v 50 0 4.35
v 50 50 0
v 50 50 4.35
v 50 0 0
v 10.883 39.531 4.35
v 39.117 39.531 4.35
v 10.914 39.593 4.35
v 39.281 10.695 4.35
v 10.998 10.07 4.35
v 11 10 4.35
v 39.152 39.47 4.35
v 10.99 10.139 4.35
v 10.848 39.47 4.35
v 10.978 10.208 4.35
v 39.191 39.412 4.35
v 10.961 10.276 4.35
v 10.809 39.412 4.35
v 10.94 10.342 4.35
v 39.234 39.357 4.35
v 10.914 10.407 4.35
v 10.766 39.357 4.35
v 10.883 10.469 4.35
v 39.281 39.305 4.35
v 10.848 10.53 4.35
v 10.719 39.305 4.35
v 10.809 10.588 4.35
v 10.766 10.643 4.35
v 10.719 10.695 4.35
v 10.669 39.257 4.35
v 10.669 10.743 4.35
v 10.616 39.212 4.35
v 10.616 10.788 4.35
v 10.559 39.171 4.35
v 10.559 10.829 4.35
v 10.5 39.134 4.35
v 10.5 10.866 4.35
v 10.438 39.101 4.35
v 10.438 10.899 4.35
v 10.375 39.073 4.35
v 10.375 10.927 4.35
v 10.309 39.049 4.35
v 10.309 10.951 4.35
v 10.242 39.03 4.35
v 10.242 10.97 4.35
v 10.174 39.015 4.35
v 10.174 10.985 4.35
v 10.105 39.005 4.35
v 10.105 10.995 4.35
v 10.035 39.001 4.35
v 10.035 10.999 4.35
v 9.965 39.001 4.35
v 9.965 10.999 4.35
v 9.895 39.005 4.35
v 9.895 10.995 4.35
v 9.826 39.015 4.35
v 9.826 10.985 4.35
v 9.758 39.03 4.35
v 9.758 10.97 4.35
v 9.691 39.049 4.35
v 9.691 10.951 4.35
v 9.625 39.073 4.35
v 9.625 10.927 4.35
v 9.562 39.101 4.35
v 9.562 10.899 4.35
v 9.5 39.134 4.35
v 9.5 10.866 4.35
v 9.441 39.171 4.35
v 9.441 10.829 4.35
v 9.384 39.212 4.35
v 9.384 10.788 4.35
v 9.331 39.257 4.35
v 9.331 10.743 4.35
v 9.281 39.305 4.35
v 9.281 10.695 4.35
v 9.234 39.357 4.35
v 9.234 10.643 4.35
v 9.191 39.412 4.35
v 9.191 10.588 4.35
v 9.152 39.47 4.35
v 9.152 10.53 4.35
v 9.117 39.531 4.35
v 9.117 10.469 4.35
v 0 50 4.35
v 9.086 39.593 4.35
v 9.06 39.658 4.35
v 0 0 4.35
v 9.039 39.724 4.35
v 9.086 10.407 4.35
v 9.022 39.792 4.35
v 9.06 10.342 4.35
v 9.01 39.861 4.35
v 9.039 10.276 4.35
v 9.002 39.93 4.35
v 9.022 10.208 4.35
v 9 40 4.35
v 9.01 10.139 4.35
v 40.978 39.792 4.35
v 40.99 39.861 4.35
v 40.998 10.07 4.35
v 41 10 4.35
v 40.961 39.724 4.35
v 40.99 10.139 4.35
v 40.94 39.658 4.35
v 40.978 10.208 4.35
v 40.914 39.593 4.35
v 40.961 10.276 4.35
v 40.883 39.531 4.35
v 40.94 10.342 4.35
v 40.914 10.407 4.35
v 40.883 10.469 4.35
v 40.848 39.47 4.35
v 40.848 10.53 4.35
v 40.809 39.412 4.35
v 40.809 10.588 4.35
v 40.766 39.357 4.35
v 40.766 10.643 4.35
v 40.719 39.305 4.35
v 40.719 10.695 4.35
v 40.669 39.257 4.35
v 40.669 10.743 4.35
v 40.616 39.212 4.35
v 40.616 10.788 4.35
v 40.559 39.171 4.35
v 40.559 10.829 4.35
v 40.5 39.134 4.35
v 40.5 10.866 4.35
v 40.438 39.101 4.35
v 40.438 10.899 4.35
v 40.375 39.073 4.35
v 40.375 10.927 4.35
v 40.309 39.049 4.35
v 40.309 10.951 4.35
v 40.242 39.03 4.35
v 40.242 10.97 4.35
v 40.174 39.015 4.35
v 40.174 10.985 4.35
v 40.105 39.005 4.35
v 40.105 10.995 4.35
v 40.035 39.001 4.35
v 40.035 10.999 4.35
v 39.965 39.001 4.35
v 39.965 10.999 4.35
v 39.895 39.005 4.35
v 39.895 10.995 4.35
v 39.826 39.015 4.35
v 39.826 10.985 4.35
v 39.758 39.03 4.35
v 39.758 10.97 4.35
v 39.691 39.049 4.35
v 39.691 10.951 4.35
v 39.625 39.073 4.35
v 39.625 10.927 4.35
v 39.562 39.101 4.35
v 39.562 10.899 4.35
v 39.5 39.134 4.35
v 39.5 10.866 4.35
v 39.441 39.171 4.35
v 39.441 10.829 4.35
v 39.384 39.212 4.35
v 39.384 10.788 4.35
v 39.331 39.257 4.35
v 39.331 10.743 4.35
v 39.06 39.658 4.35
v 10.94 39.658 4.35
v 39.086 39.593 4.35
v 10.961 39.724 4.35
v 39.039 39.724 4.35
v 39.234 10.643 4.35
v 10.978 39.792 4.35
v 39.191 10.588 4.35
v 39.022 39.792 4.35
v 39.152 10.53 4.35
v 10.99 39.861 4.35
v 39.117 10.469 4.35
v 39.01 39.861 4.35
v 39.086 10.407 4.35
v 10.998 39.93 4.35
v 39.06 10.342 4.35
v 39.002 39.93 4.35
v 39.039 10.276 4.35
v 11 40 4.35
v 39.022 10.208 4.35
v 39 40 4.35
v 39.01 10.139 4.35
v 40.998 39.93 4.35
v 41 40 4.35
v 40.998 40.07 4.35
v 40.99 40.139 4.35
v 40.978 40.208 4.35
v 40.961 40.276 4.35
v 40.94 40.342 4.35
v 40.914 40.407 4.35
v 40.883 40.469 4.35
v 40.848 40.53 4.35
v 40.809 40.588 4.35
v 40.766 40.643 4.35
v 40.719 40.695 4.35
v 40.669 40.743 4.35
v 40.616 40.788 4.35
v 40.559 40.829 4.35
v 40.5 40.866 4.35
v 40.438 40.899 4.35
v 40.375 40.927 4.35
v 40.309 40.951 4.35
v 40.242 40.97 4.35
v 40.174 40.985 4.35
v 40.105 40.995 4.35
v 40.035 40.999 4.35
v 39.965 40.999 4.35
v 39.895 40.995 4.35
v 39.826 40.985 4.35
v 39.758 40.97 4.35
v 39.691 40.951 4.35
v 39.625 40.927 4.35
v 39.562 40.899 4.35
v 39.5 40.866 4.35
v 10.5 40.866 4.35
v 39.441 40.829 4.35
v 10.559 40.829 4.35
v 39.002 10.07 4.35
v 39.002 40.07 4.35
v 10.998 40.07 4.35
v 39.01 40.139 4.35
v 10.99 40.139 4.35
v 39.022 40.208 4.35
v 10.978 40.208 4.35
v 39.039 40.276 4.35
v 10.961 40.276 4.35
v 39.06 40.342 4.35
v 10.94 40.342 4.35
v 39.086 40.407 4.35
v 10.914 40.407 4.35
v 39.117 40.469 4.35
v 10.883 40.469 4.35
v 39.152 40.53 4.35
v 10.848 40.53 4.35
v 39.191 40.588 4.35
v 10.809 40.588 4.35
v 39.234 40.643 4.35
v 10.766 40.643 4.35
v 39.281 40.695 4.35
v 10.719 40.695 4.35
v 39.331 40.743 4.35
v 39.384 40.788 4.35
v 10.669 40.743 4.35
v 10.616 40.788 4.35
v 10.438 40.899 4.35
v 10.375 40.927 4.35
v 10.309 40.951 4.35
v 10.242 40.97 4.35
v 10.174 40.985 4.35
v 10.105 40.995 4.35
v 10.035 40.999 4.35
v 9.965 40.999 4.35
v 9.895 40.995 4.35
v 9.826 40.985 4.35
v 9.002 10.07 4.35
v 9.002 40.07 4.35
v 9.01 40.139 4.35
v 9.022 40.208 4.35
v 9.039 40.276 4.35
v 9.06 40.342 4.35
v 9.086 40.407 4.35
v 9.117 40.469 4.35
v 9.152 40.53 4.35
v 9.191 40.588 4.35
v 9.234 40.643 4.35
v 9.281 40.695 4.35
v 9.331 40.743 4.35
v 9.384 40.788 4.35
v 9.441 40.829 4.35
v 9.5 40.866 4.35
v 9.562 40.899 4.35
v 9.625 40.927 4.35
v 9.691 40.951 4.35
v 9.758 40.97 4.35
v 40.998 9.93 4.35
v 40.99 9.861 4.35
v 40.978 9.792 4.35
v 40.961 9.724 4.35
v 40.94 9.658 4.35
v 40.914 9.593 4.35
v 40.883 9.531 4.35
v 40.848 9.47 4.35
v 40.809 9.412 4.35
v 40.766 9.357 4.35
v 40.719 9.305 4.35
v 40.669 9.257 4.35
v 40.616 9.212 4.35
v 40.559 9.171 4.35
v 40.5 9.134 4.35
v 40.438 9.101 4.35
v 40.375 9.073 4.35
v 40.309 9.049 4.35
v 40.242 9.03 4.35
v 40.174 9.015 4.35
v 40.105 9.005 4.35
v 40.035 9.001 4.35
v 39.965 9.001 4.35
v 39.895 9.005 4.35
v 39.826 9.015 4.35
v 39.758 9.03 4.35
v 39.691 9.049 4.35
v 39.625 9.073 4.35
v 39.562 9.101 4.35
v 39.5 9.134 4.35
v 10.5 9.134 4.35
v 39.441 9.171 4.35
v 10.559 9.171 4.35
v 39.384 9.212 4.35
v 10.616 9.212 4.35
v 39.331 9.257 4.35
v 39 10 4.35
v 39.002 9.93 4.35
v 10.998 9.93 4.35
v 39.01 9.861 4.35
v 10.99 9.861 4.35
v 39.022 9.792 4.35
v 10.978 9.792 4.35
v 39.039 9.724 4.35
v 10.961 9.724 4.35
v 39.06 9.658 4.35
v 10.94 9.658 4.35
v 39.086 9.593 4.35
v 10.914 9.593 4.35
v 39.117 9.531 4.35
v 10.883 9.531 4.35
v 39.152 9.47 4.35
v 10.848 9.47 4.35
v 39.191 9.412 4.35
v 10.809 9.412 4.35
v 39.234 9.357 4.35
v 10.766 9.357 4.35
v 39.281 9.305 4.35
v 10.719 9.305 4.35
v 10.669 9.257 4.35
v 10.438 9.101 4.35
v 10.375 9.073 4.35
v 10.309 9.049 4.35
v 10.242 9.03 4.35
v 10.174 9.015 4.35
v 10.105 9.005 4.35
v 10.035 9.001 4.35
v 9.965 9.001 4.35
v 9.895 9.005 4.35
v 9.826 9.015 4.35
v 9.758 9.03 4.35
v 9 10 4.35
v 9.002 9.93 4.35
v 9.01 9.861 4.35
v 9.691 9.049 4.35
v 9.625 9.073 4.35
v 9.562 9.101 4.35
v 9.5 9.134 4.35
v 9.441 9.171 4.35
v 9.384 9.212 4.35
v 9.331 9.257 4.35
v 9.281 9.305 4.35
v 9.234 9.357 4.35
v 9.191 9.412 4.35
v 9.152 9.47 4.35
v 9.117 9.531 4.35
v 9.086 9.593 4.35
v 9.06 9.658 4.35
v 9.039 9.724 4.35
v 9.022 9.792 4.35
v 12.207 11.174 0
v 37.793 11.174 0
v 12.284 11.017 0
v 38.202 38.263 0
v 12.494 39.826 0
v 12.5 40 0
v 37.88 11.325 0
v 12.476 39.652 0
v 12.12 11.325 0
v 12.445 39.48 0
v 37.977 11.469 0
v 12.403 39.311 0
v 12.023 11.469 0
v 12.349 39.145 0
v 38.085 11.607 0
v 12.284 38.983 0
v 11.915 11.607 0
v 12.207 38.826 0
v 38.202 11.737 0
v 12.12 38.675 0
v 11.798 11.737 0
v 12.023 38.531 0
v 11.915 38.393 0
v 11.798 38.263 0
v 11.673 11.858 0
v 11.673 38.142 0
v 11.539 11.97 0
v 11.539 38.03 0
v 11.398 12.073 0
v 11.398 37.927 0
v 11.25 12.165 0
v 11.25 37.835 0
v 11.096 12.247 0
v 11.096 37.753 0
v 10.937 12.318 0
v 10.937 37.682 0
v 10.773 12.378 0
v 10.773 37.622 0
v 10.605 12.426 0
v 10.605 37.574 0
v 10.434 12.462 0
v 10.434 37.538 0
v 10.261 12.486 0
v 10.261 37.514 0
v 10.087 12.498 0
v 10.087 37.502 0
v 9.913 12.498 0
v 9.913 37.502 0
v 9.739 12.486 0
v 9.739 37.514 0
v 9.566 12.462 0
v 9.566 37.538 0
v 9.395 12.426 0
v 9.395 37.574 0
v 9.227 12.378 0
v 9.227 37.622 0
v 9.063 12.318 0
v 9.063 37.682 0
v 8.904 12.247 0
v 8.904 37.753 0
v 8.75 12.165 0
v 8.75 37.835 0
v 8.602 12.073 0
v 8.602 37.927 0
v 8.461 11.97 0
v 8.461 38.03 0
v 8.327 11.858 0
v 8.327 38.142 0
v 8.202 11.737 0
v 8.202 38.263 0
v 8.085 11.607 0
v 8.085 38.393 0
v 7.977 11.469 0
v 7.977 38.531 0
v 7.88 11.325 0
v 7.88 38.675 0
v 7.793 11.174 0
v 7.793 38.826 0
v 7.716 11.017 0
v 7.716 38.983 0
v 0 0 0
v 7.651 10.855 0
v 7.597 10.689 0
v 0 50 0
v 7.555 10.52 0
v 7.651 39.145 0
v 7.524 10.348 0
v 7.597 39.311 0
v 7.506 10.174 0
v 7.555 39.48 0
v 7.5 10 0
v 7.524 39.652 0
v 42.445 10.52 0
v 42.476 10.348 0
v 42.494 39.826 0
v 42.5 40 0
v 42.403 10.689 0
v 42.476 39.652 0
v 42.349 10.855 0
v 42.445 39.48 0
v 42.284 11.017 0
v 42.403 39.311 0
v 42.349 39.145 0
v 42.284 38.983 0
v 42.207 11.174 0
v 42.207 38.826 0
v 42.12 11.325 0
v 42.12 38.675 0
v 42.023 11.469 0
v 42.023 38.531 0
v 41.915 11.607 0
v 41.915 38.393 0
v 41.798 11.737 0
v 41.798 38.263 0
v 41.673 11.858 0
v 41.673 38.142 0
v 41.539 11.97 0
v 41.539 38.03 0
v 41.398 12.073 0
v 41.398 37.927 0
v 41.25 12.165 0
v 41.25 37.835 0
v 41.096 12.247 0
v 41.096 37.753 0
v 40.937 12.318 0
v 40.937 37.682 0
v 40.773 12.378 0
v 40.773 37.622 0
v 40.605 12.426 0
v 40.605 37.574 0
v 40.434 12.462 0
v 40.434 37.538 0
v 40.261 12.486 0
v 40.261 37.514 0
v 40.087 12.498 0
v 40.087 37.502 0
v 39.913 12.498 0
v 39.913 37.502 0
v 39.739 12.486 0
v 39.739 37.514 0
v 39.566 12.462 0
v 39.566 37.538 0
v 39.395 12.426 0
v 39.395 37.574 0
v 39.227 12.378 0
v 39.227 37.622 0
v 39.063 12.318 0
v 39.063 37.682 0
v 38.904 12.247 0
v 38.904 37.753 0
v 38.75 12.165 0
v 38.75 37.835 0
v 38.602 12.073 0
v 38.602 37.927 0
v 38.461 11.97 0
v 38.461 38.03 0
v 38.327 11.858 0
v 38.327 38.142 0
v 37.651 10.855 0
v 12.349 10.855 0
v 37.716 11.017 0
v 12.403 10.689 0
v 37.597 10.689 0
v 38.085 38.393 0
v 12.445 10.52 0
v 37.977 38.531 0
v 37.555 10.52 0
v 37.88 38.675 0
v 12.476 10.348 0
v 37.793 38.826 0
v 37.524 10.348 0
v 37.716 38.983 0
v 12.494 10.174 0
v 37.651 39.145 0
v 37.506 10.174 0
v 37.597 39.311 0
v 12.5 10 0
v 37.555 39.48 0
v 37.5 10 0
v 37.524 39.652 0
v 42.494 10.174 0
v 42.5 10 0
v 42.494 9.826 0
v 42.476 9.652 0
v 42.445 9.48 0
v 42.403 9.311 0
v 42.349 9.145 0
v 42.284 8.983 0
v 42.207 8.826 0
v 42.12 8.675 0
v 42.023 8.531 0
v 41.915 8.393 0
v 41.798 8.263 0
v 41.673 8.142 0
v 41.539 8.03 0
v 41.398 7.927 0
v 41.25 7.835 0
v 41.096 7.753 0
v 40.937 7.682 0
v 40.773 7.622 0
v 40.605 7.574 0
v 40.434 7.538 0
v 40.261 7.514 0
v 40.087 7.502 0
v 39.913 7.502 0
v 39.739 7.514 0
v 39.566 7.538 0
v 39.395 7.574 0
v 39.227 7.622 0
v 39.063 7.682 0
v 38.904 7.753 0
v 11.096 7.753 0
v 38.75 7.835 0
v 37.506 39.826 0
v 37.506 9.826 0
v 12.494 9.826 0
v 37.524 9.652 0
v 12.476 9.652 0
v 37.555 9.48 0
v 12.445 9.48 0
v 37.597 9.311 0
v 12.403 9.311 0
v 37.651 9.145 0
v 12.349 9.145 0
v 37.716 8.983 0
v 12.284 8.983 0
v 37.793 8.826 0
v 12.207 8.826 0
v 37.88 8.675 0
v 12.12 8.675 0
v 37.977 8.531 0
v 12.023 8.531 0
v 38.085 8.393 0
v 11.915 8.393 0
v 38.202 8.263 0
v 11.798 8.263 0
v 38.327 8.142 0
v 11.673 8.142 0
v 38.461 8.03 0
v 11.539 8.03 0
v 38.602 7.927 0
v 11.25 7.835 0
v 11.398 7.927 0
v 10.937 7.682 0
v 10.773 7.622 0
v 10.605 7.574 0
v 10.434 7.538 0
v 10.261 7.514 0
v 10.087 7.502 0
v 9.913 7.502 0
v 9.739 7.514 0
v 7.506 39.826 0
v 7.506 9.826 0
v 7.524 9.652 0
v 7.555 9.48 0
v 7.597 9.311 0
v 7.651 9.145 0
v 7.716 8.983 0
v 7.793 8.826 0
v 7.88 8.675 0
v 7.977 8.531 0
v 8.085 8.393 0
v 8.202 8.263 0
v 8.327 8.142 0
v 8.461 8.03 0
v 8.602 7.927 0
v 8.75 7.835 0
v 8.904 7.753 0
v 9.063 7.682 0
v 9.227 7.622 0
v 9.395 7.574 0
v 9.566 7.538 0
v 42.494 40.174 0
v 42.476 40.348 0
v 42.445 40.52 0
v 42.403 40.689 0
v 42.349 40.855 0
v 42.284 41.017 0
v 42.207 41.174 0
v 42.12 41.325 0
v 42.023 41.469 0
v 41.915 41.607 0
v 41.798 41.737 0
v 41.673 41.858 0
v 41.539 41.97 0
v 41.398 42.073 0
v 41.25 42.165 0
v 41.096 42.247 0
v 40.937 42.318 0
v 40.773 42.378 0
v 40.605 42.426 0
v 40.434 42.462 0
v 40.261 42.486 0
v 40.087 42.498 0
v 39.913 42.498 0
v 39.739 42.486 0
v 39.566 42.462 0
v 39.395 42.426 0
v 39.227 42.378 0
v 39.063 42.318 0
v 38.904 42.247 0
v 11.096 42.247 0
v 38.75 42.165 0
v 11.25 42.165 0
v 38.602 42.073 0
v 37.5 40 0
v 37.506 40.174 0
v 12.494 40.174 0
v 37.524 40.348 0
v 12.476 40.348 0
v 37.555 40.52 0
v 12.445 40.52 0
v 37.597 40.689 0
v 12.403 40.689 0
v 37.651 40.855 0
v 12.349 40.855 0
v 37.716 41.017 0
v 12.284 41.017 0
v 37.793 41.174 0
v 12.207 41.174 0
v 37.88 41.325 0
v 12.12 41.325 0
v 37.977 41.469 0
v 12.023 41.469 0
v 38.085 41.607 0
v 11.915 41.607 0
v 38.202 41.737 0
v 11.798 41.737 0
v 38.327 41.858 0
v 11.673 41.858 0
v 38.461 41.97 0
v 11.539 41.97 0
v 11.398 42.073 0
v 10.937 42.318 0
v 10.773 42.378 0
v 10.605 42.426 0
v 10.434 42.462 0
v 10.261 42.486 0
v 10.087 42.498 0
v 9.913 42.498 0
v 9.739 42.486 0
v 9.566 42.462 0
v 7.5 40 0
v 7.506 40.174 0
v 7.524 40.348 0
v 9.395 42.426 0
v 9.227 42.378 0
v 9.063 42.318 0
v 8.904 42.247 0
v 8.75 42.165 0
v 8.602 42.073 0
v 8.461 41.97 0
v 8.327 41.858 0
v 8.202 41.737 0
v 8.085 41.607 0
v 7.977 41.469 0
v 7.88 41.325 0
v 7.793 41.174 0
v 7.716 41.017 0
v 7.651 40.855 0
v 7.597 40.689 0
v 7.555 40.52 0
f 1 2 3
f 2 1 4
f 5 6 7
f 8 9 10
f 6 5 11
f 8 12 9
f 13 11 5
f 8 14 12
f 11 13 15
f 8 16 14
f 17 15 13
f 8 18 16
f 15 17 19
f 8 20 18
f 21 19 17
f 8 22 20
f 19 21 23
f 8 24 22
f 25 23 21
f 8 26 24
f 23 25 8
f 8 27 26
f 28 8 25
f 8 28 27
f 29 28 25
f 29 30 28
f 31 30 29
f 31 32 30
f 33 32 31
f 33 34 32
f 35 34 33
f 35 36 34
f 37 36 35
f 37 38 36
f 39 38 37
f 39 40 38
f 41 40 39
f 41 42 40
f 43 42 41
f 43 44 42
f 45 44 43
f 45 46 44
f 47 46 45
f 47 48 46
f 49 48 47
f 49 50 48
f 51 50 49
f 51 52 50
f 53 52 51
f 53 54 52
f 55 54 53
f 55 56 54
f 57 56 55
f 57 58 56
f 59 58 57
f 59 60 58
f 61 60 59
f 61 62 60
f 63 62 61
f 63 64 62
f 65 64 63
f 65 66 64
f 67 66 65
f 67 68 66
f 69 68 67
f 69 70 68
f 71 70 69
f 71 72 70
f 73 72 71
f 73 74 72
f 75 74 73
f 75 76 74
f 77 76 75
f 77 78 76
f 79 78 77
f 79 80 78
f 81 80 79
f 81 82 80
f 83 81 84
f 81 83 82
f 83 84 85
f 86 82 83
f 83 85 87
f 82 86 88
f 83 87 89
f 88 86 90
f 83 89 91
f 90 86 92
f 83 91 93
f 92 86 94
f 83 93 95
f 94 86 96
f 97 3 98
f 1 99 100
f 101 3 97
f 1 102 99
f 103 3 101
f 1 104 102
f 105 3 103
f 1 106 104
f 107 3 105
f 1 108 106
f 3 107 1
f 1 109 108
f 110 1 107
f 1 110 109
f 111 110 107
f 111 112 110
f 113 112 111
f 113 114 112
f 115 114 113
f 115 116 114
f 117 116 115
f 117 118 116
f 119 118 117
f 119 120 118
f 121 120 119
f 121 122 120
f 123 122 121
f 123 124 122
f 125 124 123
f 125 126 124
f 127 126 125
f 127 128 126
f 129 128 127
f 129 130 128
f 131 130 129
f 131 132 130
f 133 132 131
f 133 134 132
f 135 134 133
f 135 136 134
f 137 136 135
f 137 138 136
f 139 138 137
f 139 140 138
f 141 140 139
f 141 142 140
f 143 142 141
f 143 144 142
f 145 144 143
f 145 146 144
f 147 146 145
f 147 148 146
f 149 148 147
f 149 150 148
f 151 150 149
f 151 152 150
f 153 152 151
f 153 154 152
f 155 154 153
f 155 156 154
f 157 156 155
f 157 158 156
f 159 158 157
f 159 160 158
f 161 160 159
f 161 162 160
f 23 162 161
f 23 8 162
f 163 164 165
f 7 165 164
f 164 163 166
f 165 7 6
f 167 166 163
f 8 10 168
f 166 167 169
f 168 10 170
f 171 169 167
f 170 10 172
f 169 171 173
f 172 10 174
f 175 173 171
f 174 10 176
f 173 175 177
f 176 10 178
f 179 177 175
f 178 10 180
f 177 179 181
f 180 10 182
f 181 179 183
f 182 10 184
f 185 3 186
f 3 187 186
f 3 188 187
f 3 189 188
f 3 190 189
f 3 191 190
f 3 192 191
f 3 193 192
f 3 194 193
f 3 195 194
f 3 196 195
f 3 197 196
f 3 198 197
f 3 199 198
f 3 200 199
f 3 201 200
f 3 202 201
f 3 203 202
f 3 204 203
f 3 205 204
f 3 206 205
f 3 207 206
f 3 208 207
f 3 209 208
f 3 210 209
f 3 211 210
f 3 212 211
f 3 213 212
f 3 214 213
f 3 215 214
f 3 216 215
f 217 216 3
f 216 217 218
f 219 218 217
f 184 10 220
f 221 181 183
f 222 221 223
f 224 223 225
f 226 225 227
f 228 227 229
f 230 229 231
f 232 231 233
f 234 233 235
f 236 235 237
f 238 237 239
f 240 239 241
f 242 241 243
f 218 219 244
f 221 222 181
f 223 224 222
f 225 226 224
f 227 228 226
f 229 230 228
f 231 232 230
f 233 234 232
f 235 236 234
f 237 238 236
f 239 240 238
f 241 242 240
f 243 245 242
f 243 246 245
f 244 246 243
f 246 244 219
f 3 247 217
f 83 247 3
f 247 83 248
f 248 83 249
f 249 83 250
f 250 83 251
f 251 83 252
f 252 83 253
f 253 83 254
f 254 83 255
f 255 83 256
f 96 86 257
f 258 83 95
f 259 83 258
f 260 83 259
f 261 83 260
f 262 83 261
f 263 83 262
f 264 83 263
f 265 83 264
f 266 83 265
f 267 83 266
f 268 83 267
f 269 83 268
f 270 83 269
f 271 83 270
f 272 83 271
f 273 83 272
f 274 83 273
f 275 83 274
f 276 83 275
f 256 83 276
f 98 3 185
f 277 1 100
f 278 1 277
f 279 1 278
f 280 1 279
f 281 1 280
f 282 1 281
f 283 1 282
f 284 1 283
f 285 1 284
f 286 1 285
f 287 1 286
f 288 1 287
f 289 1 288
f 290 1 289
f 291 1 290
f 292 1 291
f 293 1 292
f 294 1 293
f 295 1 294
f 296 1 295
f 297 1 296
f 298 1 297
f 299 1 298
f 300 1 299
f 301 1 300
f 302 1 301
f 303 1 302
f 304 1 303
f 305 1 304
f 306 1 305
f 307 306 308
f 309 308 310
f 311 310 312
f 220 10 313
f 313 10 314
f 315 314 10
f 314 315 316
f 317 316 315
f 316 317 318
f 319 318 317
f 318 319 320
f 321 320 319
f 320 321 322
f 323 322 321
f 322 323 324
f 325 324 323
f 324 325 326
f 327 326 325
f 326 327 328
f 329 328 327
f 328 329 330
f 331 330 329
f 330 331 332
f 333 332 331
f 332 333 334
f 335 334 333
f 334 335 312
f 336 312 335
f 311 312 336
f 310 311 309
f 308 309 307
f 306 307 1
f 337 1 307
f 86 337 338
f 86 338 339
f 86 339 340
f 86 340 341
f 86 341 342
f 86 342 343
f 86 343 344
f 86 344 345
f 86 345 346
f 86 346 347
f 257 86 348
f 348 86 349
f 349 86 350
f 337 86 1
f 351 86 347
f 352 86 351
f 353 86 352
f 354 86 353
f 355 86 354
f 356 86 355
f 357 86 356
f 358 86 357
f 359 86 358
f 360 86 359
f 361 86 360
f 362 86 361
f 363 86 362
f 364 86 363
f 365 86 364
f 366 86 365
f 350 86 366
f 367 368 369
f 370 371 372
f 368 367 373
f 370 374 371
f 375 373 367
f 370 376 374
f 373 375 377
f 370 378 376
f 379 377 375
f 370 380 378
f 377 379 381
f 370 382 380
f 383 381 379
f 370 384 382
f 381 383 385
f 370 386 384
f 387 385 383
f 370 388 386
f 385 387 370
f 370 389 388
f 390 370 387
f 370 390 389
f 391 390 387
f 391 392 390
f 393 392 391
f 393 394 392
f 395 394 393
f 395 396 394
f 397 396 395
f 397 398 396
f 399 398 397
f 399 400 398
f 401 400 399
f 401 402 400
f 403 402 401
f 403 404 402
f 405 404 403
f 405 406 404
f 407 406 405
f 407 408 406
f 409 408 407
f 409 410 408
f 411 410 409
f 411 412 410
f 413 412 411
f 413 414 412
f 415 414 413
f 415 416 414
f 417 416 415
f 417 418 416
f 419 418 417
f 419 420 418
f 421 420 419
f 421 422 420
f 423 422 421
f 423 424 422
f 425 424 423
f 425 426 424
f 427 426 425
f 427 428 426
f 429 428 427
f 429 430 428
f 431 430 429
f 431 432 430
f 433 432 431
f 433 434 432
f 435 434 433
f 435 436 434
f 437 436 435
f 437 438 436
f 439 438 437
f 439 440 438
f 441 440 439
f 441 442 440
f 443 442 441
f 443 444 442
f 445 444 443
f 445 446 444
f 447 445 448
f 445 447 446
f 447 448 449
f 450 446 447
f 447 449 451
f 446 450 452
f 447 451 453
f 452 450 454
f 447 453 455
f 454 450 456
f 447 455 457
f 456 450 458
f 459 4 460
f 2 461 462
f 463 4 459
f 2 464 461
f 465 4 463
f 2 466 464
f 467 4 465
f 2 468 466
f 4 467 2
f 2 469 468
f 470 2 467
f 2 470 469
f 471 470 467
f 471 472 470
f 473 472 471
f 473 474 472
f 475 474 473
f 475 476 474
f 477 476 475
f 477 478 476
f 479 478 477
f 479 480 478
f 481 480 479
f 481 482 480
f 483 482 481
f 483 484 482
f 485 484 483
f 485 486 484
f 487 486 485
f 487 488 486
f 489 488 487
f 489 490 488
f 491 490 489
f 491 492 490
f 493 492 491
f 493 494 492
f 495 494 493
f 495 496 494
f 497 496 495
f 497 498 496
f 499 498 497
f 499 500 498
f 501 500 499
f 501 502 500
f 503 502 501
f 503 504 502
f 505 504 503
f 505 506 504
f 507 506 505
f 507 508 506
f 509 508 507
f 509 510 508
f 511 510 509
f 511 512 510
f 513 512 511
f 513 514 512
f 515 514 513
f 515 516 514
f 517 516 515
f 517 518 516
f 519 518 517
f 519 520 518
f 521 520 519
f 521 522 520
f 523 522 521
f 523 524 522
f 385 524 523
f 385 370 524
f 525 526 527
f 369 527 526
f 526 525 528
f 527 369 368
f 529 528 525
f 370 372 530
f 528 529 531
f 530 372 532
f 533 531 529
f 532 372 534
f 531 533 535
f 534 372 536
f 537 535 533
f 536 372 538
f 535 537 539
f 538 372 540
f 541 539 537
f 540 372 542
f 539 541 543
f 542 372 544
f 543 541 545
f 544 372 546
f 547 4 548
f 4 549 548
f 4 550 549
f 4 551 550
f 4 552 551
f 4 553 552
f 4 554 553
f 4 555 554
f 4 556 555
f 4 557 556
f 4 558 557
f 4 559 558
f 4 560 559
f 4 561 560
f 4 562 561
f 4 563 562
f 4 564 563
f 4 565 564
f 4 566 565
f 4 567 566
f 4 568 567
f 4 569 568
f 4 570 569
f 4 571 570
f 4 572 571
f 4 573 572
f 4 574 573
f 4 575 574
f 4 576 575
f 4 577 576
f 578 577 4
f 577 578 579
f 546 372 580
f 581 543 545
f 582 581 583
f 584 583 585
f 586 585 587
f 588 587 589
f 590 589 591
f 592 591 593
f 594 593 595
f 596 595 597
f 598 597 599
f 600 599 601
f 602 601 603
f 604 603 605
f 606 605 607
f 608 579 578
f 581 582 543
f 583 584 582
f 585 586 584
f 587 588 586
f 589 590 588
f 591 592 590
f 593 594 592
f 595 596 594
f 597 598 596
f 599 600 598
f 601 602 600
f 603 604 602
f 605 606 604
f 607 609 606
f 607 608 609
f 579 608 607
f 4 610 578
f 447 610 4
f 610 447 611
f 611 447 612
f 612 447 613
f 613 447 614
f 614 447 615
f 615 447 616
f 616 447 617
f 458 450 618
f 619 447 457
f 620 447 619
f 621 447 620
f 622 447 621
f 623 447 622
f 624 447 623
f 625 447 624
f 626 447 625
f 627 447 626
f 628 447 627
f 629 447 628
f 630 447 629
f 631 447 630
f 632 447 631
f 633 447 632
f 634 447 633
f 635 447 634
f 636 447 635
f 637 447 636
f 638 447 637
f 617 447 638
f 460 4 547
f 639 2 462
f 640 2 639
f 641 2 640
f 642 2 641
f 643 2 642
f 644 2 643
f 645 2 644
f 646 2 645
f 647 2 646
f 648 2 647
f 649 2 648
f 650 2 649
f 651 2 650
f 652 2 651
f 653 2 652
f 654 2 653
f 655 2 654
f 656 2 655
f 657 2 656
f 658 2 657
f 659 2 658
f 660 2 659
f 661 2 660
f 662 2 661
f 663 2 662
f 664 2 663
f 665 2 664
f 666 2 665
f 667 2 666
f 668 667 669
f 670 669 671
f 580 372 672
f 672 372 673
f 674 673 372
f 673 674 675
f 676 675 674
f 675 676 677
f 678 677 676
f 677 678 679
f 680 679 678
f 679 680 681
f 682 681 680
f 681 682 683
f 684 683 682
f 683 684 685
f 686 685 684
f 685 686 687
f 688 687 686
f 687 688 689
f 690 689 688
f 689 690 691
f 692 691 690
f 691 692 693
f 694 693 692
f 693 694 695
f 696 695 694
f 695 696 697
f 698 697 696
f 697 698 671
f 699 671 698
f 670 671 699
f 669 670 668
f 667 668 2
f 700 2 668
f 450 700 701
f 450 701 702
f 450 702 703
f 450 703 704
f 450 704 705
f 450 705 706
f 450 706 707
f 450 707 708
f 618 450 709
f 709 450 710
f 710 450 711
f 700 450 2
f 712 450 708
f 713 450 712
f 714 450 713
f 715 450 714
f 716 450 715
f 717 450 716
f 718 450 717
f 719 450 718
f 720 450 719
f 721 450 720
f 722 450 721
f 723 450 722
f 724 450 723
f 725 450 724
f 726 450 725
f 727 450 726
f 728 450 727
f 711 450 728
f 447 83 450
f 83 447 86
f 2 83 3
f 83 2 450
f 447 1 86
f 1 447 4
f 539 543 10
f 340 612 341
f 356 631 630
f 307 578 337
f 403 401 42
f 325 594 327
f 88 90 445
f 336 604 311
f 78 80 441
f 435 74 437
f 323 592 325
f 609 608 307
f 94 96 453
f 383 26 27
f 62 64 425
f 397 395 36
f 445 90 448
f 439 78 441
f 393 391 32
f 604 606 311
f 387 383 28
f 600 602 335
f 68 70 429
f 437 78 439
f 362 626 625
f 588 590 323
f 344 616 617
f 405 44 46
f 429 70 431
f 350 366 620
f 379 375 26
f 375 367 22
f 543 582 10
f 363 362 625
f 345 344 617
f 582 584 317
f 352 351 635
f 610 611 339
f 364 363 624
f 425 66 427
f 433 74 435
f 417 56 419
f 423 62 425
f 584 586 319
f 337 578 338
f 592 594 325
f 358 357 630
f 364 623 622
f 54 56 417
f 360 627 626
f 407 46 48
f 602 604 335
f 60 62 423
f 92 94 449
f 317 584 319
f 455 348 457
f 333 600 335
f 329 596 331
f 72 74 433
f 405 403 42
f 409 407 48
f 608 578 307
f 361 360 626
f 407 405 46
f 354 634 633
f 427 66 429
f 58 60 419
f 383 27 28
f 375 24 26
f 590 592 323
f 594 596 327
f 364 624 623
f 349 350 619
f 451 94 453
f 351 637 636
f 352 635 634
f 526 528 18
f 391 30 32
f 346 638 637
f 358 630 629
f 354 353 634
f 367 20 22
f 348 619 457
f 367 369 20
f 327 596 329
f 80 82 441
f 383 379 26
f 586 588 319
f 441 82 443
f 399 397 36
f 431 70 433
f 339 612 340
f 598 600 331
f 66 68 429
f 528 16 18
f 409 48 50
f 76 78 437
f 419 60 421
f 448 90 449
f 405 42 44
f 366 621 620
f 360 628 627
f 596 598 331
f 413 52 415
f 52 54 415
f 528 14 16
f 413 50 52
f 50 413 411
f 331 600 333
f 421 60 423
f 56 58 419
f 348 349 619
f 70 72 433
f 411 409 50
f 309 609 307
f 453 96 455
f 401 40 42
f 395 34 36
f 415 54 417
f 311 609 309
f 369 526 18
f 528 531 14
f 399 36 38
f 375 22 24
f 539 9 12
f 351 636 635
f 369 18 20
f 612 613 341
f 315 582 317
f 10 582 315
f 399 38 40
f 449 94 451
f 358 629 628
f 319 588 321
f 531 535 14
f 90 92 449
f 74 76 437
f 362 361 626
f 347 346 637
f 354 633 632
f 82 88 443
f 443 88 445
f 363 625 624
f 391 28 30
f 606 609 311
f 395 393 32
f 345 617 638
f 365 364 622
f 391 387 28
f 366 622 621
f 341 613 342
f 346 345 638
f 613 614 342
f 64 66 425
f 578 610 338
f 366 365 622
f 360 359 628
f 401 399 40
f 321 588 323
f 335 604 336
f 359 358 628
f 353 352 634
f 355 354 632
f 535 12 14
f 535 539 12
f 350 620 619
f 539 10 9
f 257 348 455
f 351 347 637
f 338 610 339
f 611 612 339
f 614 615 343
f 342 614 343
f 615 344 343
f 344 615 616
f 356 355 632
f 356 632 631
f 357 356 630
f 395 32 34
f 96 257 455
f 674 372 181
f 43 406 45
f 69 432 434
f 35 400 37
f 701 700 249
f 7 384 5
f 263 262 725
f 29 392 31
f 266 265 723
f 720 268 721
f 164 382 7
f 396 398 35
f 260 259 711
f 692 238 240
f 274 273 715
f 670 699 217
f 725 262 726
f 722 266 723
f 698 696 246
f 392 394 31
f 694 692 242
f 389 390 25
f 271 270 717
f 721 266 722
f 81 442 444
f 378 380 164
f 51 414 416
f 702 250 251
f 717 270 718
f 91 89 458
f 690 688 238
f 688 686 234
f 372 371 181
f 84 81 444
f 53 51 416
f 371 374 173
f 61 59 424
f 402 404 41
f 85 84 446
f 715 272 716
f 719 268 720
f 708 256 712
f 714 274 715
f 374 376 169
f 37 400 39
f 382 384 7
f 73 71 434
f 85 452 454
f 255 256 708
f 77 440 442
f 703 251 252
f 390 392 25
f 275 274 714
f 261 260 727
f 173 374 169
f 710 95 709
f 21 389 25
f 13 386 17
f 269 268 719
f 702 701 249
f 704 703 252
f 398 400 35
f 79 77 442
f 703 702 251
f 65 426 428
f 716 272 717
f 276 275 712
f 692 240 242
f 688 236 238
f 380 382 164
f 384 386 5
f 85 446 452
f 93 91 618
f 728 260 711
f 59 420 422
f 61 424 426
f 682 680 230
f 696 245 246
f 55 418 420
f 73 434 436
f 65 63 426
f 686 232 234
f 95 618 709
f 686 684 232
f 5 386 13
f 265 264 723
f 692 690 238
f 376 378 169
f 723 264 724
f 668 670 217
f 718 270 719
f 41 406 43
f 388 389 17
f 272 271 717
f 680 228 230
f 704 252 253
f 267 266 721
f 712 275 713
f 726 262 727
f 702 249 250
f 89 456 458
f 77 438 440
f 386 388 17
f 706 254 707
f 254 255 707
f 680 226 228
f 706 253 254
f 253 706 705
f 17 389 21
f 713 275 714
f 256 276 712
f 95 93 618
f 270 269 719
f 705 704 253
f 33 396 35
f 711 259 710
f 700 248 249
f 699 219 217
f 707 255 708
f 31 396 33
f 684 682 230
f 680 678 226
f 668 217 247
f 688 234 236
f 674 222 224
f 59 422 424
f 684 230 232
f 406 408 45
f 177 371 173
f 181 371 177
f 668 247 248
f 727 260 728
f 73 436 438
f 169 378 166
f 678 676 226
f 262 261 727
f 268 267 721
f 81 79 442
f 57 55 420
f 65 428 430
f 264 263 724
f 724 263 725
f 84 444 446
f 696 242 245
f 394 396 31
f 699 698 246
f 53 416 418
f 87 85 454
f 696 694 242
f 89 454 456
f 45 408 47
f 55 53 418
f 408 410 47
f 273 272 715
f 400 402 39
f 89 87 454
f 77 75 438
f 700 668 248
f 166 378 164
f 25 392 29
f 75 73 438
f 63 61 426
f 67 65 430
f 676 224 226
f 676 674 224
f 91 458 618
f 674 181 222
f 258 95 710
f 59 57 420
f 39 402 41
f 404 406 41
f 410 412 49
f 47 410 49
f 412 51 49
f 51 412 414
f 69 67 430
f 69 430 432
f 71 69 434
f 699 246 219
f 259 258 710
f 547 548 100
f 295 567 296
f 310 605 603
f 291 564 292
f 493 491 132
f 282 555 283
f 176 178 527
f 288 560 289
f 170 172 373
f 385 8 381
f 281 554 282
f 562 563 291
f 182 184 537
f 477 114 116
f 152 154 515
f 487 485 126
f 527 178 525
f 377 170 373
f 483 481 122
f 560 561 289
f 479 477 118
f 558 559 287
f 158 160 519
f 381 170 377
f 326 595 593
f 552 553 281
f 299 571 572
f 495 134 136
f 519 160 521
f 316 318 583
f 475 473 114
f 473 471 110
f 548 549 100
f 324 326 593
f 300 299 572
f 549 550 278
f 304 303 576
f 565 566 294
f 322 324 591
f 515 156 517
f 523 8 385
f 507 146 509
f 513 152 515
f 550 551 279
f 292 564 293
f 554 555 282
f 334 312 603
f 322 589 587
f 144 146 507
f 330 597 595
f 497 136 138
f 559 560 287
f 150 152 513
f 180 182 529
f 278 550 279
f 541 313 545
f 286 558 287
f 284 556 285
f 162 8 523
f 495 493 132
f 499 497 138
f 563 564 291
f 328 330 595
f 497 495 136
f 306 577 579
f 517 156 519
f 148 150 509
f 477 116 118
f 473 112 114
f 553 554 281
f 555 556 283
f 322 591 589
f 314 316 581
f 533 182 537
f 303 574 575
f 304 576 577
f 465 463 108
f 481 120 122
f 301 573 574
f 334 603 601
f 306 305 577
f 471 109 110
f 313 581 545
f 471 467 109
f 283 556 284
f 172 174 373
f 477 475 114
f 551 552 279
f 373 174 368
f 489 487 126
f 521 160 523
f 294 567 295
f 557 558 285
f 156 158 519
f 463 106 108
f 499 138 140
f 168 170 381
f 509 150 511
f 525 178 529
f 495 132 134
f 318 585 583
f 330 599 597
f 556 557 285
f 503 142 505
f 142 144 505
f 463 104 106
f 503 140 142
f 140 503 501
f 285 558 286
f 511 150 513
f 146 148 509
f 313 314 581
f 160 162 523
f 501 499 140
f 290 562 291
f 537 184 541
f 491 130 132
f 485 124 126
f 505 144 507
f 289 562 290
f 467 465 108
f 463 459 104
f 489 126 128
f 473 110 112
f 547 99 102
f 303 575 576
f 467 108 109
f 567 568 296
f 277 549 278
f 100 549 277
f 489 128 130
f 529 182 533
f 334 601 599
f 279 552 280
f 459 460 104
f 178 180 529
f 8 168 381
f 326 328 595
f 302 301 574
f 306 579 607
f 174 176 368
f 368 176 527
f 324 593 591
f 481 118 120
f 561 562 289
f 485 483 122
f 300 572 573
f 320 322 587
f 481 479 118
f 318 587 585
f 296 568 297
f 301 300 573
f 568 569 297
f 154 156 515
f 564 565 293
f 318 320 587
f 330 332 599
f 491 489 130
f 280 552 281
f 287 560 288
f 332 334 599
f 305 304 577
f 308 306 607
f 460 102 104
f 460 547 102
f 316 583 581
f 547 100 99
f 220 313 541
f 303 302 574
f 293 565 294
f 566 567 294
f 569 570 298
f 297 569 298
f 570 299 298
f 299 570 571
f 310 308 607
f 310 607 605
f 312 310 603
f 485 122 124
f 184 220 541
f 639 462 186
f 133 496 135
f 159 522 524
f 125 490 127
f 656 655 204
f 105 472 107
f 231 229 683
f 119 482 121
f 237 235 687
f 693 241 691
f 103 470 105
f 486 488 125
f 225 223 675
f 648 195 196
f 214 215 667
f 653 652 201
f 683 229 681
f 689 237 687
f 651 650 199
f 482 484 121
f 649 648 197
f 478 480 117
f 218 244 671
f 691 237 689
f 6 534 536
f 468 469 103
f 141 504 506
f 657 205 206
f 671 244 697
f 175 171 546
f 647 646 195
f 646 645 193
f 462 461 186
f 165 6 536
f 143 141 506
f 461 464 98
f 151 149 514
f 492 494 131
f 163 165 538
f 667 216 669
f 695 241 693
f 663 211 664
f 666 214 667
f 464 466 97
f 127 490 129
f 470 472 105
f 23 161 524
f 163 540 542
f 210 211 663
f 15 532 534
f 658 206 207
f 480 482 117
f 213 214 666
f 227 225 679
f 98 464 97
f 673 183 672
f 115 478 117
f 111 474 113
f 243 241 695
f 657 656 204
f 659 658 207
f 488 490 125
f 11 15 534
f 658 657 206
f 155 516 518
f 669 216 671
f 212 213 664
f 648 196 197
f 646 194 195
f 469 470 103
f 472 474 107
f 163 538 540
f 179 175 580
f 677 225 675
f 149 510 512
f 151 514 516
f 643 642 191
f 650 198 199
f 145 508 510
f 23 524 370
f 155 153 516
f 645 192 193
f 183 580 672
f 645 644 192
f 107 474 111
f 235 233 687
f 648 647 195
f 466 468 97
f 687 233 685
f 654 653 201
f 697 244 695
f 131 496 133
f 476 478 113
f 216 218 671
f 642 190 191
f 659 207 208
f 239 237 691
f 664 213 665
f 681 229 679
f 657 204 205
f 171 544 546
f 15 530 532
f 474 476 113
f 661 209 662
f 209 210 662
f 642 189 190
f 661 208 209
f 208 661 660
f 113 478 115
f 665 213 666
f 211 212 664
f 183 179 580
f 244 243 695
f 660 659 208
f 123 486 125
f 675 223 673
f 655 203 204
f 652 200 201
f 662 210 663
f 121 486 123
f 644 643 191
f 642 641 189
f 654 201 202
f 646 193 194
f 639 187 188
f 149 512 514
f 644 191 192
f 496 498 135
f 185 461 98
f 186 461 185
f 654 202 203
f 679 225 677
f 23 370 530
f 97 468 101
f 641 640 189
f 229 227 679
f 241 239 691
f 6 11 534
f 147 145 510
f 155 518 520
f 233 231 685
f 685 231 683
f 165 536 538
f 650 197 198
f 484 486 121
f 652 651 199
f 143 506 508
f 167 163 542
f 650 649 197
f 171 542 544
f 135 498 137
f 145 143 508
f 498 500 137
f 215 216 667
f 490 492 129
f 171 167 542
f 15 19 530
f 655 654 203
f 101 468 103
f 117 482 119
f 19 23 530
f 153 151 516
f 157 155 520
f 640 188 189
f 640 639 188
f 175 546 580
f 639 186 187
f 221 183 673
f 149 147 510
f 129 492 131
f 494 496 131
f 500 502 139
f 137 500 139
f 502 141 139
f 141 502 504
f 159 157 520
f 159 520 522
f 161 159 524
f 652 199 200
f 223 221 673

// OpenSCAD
sk=5;
d=12.5-8.15;
$fn=90;


difference()
{
cube([50,50,d]);

translate([10,10,0])
cylinder(h=d, d1=sk, d2=2);
    
    translate([10,40,0])
cylinder(h=d, d1=sk, d2=2);
    
    
    translate([40,10,0])
cylinder(h=d, d1=sk, d2=2);
    
    
    translate([40,40,0])
cylinder(h=d, d1=sk, d2=2);
    
    
}
